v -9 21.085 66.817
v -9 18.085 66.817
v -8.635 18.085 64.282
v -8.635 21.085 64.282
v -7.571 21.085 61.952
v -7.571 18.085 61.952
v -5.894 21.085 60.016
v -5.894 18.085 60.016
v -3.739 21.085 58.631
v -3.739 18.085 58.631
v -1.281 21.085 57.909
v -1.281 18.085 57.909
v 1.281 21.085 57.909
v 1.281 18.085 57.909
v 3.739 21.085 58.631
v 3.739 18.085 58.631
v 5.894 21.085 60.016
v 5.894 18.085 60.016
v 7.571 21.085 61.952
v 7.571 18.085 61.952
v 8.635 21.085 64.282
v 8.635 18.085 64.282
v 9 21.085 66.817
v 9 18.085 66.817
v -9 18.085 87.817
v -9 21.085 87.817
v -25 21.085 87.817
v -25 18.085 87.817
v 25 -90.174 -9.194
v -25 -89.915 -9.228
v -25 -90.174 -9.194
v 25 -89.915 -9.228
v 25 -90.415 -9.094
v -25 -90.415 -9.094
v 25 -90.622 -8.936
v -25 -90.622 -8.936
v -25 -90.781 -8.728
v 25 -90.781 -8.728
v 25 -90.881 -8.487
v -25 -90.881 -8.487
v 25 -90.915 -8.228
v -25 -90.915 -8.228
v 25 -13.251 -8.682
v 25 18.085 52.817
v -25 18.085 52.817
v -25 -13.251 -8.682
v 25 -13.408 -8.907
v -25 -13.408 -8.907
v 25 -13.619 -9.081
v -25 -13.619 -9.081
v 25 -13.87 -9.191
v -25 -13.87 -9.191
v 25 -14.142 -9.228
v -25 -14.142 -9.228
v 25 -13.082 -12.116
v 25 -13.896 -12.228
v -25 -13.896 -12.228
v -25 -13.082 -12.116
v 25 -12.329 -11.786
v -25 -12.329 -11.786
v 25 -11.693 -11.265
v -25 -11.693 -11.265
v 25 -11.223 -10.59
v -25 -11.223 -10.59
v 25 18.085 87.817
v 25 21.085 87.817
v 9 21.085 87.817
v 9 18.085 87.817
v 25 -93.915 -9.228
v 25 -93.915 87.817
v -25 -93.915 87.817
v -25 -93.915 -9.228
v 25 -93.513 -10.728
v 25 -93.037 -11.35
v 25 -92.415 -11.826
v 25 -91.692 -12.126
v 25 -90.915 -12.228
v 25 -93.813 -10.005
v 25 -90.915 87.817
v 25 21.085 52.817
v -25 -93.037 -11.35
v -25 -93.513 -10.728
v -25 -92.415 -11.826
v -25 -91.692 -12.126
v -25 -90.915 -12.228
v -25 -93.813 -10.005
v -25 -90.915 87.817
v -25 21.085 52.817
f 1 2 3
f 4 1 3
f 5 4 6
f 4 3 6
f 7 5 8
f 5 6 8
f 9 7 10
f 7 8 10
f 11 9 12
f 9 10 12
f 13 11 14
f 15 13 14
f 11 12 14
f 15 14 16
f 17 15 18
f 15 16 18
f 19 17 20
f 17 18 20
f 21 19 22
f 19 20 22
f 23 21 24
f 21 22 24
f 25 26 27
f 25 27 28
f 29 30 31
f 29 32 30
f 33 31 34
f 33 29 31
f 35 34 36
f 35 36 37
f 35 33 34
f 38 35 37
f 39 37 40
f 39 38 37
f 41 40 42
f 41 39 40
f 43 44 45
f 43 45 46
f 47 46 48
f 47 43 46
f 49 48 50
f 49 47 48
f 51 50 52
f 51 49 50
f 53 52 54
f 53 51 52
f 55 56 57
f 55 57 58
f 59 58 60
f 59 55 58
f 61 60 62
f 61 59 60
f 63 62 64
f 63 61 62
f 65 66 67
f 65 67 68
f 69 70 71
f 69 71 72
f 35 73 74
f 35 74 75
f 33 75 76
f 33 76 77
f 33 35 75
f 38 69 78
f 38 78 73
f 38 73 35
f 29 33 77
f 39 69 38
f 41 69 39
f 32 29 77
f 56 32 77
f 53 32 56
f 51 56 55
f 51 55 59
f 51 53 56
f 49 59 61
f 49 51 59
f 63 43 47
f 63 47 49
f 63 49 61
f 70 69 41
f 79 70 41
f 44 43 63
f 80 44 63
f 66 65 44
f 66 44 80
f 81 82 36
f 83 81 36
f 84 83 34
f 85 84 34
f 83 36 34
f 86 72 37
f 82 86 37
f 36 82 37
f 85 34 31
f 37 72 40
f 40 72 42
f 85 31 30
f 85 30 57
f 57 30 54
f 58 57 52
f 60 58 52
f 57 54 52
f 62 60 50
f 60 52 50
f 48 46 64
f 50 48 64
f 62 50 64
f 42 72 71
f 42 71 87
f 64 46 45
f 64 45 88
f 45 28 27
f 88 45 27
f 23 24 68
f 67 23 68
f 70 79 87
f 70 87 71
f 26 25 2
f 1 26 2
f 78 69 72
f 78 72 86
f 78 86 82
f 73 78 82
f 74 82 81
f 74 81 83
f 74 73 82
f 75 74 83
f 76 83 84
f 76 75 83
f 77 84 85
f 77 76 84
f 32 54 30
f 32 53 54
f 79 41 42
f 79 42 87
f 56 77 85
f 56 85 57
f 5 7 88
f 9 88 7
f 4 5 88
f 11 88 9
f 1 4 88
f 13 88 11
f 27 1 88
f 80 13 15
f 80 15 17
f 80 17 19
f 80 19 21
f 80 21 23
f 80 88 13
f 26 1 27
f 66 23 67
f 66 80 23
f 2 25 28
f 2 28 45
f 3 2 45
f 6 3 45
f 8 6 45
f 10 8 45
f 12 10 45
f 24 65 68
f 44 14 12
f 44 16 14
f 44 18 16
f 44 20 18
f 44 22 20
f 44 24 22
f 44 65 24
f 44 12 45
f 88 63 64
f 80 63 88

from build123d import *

# Parameters (mm, degrees)
F2_DEPTH = 25
F3_DEPTH = 25


with BuildPart() as f2:
    # F1 (on Right) → F2 (new body, symmetric)
    with BuildSketch(Plane.YZ):
        with BuildLine():
            ThreePointArc((-89.915201, -9.228394), (-90.622307, -8.935501), (-90.915201, -8.228394))
            Line((-90.915201, -8.228394), (-90.915201, 87.817343))
            Line((-90.915201, 87.817343), (-93.915201, 87.817343))
            Line((-93.915201, 87.817343), (-93.915201, -9.228394))
            ThreePointArc((-93.915201, -9.228394), (-93.036521, -11.349715), (-90.915201, -12.228394))
            Line((-90.915201, -12.228394), (-13.896061, -12.228394))
            ThreePointArc((-13.896061, -12.228394), (-12.328566, -11.786315), (-11.223042, -10.590366))
            Line((-11.223042, -10.590366), (21.084799, 52.817343))
            Line((21.084799, 52.817343), (21.084799, 87.817343))
            Line((21.084799, 87.817343), (18.084799, 87.817343))
            Line((18.084799, 87.817343), (18.084799, 52.817343))
            Line((18.084799, 52.817343), (-13.250877, -8.682385))
            ThreePointArc((-13.250877, -8.682385), (-13.619385, -9.081035), (-14.141883, -9.228394))
            Line((-14.141883, -9.228394), (-89.915201, -9.228394))
        make_face()
    extrude(amount=F2_DEPTH, both=True)

    # F0 (on Front) → F3 (cut)
    with BuildSketch(Plane.XZ):
        with BuildLine():
            ThreePointArc((-9, 66.817343), (0, 57.817343), (9, 66.817343))
            ThreePointArc((9, 66.817343), (0, 75.817343), (-9, 66.817343))
        make_face()
        with BuildLine():
            Line((9, 66.817343), (9, 87.817343))
            Line((9, 87.817343), (-9, 87.817343))
            Line((-9, 87.817343), (-9, 66.817343))
            ThreePointArc((-9, 66.817343), (0, 75.817343), (9, 66.817343))
        make_face()
    extrude(amount=-F3_DEPTH, mode=Mode.SUBTRACT)


solid = f2.part
